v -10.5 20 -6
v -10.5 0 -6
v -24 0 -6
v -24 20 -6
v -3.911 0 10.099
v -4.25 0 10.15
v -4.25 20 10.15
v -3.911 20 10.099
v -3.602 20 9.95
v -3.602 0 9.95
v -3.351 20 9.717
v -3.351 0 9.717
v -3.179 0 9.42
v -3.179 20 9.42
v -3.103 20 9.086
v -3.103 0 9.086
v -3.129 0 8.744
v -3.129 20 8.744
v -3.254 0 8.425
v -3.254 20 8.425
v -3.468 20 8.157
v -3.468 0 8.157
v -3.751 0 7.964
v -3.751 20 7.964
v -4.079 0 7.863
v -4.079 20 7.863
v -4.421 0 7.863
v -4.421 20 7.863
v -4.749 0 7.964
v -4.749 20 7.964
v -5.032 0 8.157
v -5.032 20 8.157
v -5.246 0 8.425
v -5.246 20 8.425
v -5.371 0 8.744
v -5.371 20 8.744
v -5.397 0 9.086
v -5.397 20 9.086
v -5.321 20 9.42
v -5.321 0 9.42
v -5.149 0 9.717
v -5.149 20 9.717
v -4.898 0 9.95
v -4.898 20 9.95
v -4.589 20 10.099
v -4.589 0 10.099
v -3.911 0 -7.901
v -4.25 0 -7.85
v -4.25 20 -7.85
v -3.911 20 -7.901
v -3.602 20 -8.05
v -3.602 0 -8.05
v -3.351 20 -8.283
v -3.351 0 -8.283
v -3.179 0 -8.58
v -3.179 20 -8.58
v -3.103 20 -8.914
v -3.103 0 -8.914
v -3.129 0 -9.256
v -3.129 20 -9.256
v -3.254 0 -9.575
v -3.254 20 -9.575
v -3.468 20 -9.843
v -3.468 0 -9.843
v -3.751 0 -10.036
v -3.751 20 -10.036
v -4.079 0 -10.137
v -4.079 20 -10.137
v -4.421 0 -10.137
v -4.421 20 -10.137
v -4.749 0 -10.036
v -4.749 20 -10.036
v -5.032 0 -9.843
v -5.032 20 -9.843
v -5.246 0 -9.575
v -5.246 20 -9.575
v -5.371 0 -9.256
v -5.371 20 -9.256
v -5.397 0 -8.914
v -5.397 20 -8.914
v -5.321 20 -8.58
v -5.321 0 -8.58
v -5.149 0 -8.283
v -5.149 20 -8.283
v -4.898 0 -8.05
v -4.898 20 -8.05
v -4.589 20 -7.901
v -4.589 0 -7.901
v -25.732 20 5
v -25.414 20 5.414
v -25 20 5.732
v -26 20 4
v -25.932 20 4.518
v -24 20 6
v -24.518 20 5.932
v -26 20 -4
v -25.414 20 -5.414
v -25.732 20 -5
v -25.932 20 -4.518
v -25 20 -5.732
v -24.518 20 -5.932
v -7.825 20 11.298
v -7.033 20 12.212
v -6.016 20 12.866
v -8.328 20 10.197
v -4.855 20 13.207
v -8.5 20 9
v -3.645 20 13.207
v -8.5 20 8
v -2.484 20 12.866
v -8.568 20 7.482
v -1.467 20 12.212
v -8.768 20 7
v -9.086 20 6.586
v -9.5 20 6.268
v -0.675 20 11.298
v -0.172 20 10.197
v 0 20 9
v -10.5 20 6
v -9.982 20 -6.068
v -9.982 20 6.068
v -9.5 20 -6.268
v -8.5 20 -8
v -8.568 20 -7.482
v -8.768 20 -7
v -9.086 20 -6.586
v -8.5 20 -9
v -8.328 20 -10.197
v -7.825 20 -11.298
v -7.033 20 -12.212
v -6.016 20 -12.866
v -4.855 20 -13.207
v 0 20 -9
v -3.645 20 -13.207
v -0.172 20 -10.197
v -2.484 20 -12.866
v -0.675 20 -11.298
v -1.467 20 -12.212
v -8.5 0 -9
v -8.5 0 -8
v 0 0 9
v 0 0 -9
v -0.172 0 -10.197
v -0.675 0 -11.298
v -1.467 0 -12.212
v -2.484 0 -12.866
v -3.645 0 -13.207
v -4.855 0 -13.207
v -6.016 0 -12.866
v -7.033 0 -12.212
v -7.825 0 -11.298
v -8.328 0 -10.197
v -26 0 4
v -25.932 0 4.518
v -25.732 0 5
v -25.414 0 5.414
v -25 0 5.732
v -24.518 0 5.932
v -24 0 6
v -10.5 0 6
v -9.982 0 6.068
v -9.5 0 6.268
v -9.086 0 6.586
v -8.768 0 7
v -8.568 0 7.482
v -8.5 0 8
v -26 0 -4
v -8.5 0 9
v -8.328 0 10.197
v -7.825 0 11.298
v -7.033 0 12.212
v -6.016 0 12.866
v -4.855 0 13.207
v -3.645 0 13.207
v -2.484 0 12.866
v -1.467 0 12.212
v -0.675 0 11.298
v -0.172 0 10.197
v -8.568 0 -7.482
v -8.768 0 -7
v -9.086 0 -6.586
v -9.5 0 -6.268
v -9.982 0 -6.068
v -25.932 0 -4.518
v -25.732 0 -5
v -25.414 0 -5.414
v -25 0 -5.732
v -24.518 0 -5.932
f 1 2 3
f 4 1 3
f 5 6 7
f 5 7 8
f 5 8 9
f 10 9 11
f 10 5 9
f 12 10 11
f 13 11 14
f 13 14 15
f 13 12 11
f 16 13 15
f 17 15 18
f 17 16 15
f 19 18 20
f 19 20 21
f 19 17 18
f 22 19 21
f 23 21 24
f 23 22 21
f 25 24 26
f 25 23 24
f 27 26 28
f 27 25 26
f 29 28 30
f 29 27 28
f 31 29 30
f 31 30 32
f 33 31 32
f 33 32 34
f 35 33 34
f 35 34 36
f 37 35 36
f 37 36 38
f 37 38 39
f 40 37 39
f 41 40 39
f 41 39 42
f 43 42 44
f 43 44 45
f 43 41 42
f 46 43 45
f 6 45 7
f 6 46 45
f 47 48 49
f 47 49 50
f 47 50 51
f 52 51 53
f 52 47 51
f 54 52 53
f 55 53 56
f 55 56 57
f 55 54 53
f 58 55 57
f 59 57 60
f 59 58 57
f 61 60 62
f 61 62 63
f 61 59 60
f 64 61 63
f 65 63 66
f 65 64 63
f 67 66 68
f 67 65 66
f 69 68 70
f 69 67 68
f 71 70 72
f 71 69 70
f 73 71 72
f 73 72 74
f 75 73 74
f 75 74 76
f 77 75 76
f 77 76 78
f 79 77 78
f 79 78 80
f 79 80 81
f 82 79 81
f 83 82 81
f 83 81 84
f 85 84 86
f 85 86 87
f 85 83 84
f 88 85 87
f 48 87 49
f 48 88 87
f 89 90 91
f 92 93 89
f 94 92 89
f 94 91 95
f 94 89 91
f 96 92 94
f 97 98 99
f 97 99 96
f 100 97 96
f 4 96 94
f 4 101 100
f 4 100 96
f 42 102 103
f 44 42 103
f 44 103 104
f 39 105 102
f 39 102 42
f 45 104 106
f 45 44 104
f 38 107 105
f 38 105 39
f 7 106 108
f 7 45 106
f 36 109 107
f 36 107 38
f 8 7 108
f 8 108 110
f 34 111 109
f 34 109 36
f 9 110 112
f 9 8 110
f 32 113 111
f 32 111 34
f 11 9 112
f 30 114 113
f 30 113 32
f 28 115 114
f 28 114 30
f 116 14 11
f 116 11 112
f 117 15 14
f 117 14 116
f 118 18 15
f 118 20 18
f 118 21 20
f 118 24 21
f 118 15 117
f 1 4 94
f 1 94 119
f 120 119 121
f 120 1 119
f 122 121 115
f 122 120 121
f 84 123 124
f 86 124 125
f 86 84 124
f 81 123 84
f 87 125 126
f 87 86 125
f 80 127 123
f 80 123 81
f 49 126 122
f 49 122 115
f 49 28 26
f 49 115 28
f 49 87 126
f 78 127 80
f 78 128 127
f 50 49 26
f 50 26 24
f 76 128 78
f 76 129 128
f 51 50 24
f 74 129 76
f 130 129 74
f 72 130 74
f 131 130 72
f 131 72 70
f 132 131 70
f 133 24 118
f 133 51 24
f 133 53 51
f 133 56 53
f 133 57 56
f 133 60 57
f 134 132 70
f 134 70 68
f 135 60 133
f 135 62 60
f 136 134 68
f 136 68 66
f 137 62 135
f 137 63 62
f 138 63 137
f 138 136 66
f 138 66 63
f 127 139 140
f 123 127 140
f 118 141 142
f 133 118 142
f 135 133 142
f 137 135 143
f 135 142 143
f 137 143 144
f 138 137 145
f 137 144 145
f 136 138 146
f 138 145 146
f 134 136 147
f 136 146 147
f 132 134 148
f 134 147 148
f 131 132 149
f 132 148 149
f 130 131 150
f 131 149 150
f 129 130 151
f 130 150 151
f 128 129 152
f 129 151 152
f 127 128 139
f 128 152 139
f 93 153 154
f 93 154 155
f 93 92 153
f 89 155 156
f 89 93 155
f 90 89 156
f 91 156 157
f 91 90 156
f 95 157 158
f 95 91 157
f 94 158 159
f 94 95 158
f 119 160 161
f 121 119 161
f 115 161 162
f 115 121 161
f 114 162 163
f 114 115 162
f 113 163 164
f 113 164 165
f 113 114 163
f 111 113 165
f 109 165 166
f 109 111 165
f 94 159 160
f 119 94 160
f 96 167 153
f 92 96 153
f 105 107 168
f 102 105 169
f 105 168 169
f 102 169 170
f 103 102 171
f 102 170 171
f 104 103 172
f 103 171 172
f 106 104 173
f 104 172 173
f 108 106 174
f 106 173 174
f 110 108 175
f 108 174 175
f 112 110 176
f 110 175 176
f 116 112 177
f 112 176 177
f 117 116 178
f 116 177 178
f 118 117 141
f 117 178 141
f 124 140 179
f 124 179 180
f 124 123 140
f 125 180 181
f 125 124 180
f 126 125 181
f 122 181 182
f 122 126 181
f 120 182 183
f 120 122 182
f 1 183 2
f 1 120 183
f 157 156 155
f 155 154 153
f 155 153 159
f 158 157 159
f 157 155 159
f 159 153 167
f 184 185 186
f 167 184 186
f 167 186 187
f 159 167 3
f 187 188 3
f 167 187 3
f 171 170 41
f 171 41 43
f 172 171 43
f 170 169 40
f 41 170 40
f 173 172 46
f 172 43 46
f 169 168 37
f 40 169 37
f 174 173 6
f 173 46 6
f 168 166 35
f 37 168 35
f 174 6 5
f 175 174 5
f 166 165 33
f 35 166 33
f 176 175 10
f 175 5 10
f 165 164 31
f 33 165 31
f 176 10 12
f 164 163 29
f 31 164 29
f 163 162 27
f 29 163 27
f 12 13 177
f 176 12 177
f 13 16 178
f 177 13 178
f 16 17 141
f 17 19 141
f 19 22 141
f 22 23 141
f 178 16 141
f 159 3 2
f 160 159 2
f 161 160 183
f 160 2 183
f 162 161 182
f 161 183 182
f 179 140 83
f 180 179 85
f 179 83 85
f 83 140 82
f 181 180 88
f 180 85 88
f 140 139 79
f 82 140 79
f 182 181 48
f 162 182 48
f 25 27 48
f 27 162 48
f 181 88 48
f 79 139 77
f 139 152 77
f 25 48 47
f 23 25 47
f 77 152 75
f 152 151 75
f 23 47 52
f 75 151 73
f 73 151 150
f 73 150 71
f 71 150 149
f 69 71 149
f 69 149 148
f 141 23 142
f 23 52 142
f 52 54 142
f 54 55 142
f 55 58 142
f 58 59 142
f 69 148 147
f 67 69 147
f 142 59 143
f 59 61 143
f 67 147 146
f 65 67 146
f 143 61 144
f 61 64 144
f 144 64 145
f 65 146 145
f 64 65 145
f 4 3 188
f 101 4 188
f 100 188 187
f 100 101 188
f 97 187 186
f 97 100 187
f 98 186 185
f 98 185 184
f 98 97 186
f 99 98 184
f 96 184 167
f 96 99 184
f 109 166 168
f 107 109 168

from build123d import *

# Parameters (mm, degrees)
ESBO_O1_R                = 1.15
RESSALTO_EXTRUS_O1_DEPTH = 20
FILETE1_R                = 2


with BuildPart() as part:
    # Esboço1 → Ressalto-extrusão1 (new body)
    with BuildSketch(Plane(origin=(0, 0, 0), x_dir=(1, 0, 0), z_dir=(0, 1, 0))):
        with BuildLine():
            Line((-8.5, 9), (-8.5, 6))
            Line((-8.5, 6), (-26, 6))
            Line((-26, 6), (-26, -6))
            Line((-26, -6), (-8.5, -6))
            Line((-8.5, -6), (-8.5, -9))
            ThreePointArc((-8.5, -9), (-4.25, -13.25), (0, -9))
            Line((0, -9), (0, 9))
            ThreePointArc((0, 9), (-4.25, 13.25), (-8.5, 9))
        make_face()
        with Locations(Location((-4.25, 9, 0), (0, 0, 270))):
            Circle(ESBO_O1_R, mode=Mode.SUBTRACT)
        with Locations(Location((-4.25, -9, 0), (0, 0, 270))):
            Circle(ESBO_O1_R, mode=Mode.SUBTRACT)
    extrude(amount=RESSALTO_EXTRUS_O1_DEPTH)

    # Filete1
    filete1_edges = [part.edges().sort_by_distance(p)[0] for p in [
        (-8.5, 10, 6),
        (-26, 10, 6),
        (-26, 10, -6),
        (-8.5, 10, -6),
    ]]
    fillet(filete1_edges, radius=FILETE1_R)


solid = part.part
